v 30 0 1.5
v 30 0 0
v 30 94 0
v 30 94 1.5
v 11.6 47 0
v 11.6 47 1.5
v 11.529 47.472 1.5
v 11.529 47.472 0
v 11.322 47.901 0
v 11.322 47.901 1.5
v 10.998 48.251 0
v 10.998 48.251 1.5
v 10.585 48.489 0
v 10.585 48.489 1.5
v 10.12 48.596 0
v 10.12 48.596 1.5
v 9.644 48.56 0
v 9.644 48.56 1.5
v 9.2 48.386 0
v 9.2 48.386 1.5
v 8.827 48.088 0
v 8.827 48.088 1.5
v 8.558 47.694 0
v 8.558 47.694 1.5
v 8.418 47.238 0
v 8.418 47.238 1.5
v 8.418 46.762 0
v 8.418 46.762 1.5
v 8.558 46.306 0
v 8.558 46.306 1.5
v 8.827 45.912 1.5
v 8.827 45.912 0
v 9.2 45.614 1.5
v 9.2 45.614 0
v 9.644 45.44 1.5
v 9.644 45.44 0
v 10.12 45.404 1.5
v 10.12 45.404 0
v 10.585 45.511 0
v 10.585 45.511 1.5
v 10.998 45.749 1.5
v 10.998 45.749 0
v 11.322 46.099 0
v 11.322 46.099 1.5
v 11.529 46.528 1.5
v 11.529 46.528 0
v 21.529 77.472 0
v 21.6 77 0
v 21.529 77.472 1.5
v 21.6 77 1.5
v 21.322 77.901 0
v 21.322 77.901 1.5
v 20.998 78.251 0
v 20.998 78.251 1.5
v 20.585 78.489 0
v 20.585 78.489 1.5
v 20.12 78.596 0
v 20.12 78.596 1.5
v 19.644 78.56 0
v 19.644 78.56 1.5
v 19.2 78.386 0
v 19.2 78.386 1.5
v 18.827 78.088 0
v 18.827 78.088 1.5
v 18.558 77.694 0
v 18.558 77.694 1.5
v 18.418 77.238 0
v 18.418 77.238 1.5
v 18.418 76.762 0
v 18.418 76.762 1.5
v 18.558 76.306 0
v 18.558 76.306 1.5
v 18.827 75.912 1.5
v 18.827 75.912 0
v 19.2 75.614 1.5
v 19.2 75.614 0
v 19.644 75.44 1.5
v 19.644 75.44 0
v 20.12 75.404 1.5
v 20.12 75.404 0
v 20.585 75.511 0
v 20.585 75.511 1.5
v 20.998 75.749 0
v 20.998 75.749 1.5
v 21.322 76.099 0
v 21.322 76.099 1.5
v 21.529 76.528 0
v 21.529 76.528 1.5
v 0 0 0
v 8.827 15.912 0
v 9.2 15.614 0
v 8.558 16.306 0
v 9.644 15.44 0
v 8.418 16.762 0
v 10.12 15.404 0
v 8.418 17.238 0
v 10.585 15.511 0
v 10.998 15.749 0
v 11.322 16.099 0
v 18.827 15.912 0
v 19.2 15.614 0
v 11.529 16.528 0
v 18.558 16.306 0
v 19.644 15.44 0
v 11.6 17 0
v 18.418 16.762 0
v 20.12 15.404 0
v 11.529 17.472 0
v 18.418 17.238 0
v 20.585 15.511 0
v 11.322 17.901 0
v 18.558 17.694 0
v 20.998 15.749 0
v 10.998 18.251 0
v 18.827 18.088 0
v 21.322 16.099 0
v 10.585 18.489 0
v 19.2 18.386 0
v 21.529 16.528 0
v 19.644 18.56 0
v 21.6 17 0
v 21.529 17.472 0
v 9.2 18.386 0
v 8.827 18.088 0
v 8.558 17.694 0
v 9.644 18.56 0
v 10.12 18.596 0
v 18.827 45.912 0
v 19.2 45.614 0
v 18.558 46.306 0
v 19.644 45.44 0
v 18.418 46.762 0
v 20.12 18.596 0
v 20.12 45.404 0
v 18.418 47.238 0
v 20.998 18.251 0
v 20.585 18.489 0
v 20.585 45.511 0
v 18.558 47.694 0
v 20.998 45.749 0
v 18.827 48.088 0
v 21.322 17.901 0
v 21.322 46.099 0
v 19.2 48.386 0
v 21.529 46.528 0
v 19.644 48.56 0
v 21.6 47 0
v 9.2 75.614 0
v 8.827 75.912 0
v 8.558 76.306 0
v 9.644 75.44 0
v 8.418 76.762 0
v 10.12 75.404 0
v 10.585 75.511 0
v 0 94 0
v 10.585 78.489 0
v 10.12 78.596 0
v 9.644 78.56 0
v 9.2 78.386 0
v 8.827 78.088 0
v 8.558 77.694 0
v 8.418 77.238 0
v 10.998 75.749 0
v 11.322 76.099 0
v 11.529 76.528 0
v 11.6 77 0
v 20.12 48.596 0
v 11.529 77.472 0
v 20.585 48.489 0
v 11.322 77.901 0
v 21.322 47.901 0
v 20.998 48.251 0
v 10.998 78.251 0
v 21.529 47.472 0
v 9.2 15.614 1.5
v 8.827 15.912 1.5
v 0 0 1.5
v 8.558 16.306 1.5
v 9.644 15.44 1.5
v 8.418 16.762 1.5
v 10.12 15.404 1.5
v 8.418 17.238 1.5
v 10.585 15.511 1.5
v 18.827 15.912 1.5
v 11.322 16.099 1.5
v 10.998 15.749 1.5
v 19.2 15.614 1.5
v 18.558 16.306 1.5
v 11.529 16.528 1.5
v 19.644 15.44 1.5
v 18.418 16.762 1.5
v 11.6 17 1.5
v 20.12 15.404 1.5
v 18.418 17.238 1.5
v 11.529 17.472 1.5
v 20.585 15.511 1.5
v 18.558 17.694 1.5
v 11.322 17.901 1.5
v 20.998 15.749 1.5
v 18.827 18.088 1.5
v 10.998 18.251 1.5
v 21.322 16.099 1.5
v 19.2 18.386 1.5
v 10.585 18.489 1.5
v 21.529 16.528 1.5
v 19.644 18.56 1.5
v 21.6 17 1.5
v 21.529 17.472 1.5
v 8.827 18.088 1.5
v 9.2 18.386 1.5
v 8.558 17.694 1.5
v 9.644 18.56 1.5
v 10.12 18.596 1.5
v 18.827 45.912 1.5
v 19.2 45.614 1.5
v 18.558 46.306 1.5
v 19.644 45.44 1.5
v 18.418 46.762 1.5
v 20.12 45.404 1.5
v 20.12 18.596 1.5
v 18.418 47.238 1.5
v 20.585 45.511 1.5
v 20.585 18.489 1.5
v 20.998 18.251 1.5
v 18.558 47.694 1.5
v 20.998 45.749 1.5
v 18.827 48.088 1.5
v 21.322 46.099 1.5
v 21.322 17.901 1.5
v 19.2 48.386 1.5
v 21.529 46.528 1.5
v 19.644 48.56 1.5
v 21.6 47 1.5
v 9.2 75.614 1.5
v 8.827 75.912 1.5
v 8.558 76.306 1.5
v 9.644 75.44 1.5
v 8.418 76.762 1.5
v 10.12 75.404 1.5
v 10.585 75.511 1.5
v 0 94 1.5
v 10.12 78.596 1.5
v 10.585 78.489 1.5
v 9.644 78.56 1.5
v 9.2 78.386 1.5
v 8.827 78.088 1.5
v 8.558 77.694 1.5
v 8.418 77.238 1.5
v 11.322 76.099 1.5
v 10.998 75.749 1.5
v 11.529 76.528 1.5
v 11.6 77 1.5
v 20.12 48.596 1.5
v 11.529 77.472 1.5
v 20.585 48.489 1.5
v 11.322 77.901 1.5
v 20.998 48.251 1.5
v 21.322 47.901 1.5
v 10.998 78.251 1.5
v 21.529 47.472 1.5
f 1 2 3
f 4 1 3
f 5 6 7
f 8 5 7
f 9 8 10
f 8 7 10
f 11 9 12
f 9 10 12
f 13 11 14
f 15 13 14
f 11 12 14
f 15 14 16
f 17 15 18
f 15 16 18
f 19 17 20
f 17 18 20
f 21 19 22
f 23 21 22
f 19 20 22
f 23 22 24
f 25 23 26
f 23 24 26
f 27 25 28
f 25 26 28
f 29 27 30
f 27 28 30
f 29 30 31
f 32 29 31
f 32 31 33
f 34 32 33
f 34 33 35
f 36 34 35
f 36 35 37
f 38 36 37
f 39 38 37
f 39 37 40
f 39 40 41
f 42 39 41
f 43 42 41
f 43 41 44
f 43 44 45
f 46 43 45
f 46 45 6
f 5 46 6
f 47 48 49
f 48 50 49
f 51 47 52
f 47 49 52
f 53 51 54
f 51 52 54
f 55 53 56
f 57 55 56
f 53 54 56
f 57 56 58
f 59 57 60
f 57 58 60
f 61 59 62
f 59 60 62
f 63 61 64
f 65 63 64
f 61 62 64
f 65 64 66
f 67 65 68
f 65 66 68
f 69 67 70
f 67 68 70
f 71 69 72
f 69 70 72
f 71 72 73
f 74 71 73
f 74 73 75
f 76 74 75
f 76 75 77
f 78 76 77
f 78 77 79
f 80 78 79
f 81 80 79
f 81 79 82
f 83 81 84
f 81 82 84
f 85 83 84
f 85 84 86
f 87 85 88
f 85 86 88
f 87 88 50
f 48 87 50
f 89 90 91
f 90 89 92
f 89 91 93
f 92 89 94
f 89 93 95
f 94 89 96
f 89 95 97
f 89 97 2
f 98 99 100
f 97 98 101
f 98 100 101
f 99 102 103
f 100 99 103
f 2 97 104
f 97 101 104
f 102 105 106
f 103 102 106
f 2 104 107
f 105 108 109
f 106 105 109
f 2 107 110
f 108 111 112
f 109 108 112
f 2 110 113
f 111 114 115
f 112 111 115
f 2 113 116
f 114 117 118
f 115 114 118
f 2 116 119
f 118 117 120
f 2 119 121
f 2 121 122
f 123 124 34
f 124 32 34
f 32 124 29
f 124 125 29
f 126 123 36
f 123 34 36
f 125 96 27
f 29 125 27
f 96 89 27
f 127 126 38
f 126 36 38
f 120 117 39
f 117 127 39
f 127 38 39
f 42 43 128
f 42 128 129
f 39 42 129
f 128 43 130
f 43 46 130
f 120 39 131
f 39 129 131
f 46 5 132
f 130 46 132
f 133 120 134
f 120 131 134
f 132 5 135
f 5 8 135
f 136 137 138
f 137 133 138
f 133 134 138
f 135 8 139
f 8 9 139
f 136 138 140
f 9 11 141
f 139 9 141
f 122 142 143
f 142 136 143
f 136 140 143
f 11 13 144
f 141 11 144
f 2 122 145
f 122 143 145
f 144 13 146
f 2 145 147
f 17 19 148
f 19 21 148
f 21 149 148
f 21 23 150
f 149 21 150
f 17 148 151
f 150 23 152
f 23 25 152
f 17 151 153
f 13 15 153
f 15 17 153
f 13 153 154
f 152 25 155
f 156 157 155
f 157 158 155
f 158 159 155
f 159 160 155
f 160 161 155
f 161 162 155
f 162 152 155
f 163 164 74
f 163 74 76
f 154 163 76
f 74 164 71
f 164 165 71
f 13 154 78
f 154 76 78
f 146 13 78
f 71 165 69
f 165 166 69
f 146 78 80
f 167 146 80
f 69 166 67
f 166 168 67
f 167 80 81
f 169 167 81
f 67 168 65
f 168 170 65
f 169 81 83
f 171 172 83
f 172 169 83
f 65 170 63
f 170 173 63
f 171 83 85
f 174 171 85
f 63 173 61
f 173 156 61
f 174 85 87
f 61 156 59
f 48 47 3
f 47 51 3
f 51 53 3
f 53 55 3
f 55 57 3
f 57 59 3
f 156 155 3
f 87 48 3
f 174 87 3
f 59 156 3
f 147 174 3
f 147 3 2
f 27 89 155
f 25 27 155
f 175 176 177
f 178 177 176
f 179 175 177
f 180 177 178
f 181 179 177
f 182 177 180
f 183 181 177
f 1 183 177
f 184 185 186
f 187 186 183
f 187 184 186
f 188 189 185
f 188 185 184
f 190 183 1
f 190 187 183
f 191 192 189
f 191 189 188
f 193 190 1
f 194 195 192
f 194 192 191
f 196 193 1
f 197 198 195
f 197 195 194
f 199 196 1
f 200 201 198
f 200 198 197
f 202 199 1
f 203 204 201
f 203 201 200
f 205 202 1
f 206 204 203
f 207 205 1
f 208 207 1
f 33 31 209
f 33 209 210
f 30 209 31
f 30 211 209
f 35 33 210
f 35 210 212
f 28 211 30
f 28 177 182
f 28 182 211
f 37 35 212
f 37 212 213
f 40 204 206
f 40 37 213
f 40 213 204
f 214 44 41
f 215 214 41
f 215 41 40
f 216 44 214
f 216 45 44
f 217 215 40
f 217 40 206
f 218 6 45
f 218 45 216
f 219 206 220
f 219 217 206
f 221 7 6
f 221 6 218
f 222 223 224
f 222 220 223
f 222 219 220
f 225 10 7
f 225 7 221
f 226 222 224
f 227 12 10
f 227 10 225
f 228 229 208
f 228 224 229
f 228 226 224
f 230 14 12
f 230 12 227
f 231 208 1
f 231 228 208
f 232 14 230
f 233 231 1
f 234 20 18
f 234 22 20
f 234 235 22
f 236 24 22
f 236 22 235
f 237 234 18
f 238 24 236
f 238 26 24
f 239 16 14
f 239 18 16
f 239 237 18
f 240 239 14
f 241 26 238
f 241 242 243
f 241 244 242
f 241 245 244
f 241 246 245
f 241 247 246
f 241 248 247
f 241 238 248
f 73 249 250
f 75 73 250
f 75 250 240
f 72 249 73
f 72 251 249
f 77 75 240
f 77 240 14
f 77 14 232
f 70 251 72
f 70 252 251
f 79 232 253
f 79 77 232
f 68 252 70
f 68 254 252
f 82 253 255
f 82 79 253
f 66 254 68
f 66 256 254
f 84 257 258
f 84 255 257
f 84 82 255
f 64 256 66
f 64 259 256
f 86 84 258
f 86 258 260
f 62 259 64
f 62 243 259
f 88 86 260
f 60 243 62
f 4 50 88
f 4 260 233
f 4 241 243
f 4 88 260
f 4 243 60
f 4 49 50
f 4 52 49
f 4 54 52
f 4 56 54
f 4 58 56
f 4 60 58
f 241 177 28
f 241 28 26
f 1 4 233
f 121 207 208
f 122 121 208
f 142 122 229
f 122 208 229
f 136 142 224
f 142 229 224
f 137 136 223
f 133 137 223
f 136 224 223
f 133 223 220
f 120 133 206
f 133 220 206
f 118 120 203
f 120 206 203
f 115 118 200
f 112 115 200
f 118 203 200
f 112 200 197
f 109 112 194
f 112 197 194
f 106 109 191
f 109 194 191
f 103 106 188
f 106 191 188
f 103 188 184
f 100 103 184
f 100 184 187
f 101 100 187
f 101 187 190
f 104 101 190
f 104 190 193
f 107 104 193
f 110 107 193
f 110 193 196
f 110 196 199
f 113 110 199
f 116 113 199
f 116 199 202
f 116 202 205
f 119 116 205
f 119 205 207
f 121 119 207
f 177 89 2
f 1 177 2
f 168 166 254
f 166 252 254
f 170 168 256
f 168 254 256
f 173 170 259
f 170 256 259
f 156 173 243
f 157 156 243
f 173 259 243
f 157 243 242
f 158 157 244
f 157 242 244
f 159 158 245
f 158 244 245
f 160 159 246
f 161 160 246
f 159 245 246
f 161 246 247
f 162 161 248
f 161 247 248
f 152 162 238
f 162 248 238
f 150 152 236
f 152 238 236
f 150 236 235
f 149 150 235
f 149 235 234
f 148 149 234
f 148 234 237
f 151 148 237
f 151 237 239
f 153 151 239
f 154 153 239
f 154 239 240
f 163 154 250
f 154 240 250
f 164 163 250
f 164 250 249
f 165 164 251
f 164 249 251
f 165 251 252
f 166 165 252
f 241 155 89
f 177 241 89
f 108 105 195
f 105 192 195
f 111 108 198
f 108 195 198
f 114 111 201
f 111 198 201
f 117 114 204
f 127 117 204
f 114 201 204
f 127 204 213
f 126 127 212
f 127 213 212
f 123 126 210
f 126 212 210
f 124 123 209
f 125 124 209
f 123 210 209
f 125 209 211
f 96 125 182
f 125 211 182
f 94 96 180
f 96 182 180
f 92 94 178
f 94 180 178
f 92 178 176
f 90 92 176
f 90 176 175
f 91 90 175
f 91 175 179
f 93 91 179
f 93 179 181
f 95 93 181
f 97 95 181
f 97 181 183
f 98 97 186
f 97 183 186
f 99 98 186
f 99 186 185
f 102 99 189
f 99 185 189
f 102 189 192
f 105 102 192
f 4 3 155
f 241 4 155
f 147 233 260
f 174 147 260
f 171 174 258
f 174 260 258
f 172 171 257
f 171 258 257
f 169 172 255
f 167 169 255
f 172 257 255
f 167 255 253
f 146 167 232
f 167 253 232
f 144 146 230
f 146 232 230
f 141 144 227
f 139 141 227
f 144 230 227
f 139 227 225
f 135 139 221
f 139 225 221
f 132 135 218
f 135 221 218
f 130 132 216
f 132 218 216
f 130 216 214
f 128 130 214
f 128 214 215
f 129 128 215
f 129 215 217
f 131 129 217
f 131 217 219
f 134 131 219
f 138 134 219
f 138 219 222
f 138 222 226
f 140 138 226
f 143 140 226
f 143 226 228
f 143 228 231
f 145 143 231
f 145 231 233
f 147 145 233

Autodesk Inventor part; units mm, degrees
ref_plane "YZ Plane" through (0, 0, 0) normal (1, 0, 0) x (0, 1, 0)
ref_plane "XZ Plane" through (0, 0, 0) normal (0, 1, 0) x (-1, 0, 0)
ref_plane "XY Plane" through (0, 0, 0) normal (0, 0, 1) x (1, 0, 0)
sketch "スケッチ1" plane through (0, 0, 0) normal (0, 0, 1) x (1, 0, 0)
  line L0 (0, 0) -> (30, 0)
  line L1 (30, 0) -> (30, 94)
  line L2 (30, 94) -> (0, 94)
  line L3 (0, 94) -> (0, 0)
  dimension "d0" = 30
  dimension "d1" = 94
extrude "プレート1" add sketch "スケッチ1" along normal blind 1.5
sketch "スケッチ2" plane through (0, 0, 1.5) normal (0, 0, 1) x (1, 0, 0)
  line L0 (30, 94) -> (30, 0) projected
  circle A0 centre (10, 47) radius 1.6
  circle A1 centre (20, 47) radius 1.6
  line L1 (30, 0) -> (0, 0) projected
  line L2 (30, 94) -> (30, 0) projected
  line L3 (0, 94) -> (30, 94) projected
  line L4 (0, 0) -> (0, 94) projected
  line L5 (15, 94) -> (15, 0)
  circle A2 centre (20, 17) radius 1.6
  circle A3 centre (10, 17) radius 1.6
  circle A4 centre (20, 77) radius 1.6
  circle A5 centre (10, 77) radius 1.6
  circle A6 centre (20, 47) radius 1.6
  circle A7 centre (10, 47) radius 1.6
  point P0 (30, 47)
  dimension "d3" = 3.2
  dimension "d4" = 3.2
  dimension "d5" = 10
  dimension "d8" = 30
  dimension "d11" = 30
extrude "切り取り1" cut sketch "スケッチ2" against normal blind 1.5 contours A0 | A1 | A2 | A3 | A4 | A5
equation "\"d14\" = Thickness"
equation "\"d2\" = Thickness"
equation "\"BendRadius\" = Thickness"
equation "\"BendReliefWidth\" = Thickness"
equation "\"BendReliefDepth\" = 0.5 * Thickness"
equation "\"CornerReliefSize\" = 4 * Thickness"
equation "\"MinimumRemnant\" = 2 * Thickness"
equation "\"TransitionRadius\" = BendRadius"
equation "\"JacobiRadiusSize\" = BendRadius"
equation "\"GapSize\" = Thickness"
equation "\"Thickness\" = 1.5"
properties part number "rail_rail" material "アルミニウム 6061"
